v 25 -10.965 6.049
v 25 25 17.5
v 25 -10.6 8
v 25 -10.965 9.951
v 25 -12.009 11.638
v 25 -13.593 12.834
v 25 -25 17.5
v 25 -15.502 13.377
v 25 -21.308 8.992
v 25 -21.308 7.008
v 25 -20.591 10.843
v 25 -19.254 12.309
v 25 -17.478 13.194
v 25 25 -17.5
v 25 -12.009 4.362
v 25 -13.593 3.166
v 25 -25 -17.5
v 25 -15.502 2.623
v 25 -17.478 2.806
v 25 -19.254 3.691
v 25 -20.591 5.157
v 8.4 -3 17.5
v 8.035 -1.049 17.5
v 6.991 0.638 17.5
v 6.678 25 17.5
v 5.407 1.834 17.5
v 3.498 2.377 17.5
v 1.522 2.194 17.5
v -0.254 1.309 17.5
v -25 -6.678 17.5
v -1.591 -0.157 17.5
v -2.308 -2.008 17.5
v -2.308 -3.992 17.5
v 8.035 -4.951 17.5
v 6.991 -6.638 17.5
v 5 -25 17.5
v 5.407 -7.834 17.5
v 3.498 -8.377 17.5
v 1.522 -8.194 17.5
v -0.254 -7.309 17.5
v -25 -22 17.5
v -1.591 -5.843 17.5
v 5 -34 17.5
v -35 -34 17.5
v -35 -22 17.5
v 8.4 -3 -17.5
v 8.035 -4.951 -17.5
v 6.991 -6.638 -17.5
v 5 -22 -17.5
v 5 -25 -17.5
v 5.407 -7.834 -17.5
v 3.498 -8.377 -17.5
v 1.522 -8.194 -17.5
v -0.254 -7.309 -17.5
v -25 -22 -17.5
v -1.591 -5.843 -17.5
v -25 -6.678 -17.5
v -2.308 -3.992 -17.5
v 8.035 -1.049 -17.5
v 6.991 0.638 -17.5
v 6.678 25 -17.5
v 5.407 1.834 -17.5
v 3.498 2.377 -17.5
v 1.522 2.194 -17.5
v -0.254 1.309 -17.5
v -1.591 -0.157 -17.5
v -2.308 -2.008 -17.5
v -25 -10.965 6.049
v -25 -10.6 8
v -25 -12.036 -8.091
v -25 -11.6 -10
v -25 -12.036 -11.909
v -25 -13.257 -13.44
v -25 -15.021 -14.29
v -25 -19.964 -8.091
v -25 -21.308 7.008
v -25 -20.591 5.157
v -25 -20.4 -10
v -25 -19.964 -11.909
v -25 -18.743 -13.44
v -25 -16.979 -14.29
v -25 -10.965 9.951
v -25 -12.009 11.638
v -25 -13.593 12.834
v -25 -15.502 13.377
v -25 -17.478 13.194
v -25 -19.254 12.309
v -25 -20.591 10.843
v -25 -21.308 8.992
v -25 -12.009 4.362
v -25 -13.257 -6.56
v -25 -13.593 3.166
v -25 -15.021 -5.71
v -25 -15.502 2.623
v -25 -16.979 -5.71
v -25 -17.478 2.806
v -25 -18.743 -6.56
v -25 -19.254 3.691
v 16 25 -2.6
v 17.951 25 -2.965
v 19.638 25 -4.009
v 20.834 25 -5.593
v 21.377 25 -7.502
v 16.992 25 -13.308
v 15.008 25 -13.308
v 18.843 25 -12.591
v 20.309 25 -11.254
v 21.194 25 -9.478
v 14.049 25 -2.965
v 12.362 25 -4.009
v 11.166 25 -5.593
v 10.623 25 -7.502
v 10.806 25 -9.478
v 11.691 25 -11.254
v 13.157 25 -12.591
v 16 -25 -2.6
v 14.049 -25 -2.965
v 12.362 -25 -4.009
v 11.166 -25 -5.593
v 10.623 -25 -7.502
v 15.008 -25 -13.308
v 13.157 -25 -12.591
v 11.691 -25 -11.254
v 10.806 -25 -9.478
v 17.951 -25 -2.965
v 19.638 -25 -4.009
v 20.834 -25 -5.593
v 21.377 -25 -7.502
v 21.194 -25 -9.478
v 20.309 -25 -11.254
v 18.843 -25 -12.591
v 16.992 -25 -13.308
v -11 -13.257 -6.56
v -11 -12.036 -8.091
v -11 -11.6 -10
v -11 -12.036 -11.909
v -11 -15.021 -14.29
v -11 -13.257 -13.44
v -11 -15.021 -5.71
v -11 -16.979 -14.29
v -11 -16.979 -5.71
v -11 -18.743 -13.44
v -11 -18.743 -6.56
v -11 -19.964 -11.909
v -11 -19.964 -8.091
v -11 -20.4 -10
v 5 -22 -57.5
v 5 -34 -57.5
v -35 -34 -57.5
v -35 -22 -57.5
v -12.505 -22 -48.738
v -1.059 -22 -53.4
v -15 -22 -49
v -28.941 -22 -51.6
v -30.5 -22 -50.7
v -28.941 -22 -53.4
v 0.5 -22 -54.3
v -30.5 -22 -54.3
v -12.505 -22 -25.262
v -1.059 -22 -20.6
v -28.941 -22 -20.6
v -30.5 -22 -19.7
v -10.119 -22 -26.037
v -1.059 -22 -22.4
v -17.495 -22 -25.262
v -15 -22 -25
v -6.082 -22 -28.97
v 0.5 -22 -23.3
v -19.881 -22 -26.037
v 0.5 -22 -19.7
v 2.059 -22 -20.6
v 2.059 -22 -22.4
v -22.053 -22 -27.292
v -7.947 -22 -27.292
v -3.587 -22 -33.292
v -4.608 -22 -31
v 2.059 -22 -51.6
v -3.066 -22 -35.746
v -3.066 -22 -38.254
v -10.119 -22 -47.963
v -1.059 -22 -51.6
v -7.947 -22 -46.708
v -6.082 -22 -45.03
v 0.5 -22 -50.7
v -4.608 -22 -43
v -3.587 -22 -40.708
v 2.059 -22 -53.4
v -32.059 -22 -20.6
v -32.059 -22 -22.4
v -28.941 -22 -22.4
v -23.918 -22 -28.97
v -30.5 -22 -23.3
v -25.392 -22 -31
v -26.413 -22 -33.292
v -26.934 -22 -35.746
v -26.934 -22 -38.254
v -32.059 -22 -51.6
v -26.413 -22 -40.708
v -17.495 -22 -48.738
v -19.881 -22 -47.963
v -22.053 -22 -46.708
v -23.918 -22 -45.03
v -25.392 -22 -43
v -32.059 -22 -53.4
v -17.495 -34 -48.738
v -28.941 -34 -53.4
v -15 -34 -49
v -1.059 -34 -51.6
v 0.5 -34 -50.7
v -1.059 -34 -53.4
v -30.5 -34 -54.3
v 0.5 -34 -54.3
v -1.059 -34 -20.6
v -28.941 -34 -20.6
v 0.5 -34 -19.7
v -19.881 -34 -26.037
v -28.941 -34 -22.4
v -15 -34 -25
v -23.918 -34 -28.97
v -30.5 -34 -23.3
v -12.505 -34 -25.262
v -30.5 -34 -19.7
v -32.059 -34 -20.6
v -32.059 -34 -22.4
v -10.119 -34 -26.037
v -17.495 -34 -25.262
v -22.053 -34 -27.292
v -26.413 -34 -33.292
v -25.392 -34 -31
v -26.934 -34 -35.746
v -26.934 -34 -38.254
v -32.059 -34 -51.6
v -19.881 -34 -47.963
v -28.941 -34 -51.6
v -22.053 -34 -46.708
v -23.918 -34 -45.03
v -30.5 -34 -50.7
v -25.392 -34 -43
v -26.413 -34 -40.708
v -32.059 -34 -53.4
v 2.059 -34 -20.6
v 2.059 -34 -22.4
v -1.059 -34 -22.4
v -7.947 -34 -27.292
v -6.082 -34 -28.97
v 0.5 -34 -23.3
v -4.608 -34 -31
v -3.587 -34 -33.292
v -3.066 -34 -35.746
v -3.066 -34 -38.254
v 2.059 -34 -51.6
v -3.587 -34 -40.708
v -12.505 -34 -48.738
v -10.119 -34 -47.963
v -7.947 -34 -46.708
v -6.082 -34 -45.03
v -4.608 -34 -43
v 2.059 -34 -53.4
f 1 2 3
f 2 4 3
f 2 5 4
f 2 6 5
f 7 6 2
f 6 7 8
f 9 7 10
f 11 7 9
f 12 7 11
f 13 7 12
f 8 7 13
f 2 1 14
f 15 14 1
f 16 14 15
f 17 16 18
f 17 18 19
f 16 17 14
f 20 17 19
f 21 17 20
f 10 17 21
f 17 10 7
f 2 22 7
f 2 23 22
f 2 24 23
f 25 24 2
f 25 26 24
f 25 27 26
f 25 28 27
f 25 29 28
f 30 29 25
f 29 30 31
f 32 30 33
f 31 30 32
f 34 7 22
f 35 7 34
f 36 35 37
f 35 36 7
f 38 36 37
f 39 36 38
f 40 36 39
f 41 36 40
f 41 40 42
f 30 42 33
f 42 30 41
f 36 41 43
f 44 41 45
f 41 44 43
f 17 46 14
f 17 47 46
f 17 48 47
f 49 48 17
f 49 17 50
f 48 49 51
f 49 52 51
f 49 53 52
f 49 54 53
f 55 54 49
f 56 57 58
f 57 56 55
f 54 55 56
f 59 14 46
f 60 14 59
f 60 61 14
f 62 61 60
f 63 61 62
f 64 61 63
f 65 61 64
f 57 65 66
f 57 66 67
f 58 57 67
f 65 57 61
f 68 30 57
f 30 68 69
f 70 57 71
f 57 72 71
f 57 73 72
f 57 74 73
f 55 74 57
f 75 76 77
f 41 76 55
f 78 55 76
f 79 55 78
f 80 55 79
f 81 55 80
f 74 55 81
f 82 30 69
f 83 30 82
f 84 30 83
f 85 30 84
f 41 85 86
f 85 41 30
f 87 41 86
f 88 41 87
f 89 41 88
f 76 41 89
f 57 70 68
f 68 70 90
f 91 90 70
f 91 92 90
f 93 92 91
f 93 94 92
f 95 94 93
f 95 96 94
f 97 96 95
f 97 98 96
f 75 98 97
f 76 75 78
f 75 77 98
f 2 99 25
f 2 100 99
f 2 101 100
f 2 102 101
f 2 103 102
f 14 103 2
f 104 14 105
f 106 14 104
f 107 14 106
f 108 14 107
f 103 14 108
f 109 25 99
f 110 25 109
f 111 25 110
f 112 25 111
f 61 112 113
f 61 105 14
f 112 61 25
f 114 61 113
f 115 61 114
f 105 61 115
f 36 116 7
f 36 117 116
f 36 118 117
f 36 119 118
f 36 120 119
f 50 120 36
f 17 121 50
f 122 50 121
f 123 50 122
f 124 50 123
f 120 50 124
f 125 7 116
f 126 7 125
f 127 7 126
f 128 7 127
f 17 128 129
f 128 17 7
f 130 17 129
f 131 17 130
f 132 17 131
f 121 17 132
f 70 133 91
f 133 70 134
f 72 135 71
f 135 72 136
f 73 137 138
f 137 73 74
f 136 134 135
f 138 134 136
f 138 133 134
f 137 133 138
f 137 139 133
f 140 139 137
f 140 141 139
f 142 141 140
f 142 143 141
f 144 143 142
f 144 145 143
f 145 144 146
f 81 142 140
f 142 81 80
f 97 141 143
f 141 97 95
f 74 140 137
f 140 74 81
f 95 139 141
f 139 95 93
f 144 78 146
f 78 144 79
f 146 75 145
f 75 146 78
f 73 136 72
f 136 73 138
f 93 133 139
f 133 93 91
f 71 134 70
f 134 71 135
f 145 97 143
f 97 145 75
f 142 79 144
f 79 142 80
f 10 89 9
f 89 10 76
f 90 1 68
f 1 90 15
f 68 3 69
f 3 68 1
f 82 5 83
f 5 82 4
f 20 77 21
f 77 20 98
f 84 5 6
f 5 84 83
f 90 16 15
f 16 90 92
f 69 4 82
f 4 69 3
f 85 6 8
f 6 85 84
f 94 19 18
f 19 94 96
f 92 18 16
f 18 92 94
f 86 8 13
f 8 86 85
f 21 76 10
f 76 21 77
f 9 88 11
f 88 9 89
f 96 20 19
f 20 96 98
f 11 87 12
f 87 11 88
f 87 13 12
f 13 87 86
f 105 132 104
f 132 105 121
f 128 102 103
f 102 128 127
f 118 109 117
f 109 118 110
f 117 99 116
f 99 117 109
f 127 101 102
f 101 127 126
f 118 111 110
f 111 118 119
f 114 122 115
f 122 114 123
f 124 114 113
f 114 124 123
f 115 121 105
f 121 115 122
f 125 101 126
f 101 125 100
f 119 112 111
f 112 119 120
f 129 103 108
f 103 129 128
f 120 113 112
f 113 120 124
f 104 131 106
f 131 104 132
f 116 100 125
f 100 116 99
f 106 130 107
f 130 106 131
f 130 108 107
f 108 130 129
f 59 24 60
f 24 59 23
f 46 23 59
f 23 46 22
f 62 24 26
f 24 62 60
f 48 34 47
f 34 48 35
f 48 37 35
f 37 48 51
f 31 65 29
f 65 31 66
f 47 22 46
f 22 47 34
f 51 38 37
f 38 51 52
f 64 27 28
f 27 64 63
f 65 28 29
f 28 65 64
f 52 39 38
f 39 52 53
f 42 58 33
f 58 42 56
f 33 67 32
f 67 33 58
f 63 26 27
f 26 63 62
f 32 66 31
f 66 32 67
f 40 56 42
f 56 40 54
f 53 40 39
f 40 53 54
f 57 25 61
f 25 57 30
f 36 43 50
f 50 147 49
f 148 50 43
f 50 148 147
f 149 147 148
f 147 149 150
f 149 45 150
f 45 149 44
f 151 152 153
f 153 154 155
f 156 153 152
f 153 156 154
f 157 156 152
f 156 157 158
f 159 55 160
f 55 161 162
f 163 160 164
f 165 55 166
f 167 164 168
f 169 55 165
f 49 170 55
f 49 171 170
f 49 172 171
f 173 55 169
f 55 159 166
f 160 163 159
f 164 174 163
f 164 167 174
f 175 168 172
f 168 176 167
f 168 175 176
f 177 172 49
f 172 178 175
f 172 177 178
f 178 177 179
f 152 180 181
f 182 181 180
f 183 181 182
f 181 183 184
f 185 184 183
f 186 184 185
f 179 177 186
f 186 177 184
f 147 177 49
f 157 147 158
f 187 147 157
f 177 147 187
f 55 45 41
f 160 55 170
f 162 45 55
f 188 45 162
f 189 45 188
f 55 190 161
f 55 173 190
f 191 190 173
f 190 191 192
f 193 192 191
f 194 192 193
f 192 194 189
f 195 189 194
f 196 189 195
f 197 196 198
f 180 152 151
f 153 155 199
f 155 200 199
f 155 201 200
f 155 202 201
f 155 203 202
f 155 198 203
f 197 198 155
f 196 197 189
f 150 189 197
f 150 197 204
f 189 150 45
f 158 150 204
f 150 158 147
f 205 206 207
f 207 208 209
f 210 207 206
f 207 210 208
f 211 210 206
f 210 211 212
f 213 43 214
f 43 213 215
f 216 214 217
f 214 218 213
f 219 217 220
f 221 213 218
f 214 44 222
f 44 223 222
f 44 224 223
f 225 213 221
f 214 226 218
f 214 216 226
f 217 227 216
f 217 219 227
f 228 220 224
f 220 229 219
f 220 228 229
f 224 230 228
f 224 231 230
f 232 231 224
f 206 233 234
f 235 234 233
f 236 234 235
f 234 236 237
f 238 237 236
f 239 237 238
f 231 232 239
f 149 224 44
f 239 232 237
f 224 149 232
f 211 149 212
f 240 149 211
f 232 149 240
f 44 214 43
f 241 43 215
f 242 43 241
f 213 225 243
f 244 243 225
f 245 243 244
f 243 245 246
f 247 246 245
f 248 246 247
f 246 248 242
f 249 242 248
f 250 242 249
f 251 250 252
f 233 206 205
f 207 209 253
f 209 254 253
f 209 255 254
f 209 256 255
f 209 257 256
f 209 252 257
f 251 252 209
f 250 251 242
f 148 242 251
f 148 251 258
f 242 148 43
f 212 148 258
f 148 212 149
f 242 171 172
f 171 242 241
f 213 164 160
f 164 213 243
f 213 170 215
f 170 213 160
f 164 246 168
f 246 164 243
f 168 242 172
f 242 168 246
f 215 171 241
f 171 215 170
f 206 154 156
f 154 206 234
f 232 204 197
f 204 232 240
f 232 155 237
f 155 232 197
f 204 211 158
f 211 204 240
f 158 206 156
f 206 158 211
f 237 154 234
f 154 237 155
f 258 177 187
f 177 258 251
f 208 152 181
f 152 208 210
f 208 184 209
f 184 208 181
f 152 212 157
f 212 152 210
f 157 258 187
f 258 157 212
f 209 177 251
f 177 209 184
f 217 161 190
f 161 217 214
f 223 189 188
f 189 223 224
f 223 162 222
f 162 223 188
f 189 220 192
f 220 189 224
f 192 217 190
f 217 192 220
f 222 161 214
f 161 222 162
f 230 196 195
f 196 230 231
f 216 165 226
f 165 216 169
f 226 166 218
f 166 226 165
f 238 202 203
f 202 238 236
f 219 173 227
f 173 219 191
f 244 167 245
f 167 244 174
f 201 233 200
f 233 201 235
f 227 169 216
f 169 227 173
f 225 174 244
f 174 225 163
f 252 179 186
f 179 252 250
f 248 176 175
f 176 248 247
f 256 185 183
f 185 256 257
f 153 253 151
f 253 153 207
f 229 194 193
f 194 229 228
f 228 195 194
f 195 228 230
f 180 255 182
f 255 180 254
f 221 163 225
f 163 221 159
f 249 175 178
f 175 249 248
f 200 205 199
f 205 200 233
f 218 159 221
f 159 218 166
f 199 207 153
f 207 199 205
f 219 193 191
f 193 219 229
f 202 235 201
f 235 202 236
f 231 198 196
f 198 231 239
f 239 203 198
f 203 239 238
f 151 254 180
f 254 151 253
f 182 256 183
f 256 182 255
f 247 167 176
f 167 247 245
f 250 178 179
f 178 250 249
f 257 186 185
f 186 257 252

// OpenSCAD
// file: corner.scad
module base()
{

difference(){
//main box
translate(v=[0,0,0]) cube(size = [50,50,35], center = true);


//8mm rod
translate(v=[-21,-16,-10]) rotate(a=[0,-90,0]) rotate(a=[0,0,90]) cylinder(h=20, r=4.4, center = true);

//3/8 all thread hole
translate(v=[-12,-16,8]) rotate(a=[0,-90,0]) rotate(a=[0,0,90]) cylinder(h=80, r=5.4, center = true);

//3/8 all thread hole
translate(v=[16,0,-8]) rotate(a=[0,-90,0]) rotate(a=[90,0,0]) cylinder(h=80, r=5.4, center = true);


// vertical 3/8 all thread hole
translate(v=[3,-3,0]) rotate(a=[0,0,0]) rotate(a=[0,0,0]) cylinder(h=80, r=5.4, center = true);
//cutout of all thread holes
//translate(v=[16,-16,0]) cube(size = [32,32,41], center = true);

translate(v=[-18,18,0]) rotate(a=[0,0,45]) cube(size = [45,25,41], center = true);
}

}


module finished()
{

base();	

}

finished();
// main file
use <corner.scad>


base();
steppermount();

module steppermount(){

steppermounty = -28;
steppermountx = -15;

difference(){
translate(v=[steppermountx,steppermounty,-20]) cube(size = [40,12,75], center = true);

//translate(v=[-30,-28,9]) cube(size = [10.1,12.1,20], center = true);

//translate(v=[-34.8,-28,-8]) rotate(a=[0,30,0]) cube(size = [10.1,12.1,22], center = true);



//motor hole
translate(v=[steppermountx+15.5,steppermounty,-37+15.5]) rotate(a=[0,-90,0]) rotate(a=[90,0,0]) cylinder(h=12.1, r=1.8, center = true);
//motor hole
translate(v=[steppermountx-15.5,steppermounty,-37-15.5]) rotate(a=[0,-90,0]) rotate(a=[90,0,0]) cylinder(h=12.1, r=1.8, center = true);
//motor hole
translate(v=[steppermountx+15.5,steppermounty,-37-15.5]) rotate(a=[0,-90,0]) rotate(a=[90,0,0]) cylinder(h=12.1, r=1.8, center = true);
//motor hole
translate(v=[steppermountx-15.5,steppermounty,-37+15.5]) rotate(a=[0,-90,0]) rotate(a=[90,0,0]) cylinder(h=12.1, r=1.8, center = true);
//motor center hole
translate(v=[steppermountx,steppermounty,-37]) rotate(a=[0,-90,0]) rotate(a=[90,0,0]) cylinder(h=12.1, r=12, center = true);
}
}
